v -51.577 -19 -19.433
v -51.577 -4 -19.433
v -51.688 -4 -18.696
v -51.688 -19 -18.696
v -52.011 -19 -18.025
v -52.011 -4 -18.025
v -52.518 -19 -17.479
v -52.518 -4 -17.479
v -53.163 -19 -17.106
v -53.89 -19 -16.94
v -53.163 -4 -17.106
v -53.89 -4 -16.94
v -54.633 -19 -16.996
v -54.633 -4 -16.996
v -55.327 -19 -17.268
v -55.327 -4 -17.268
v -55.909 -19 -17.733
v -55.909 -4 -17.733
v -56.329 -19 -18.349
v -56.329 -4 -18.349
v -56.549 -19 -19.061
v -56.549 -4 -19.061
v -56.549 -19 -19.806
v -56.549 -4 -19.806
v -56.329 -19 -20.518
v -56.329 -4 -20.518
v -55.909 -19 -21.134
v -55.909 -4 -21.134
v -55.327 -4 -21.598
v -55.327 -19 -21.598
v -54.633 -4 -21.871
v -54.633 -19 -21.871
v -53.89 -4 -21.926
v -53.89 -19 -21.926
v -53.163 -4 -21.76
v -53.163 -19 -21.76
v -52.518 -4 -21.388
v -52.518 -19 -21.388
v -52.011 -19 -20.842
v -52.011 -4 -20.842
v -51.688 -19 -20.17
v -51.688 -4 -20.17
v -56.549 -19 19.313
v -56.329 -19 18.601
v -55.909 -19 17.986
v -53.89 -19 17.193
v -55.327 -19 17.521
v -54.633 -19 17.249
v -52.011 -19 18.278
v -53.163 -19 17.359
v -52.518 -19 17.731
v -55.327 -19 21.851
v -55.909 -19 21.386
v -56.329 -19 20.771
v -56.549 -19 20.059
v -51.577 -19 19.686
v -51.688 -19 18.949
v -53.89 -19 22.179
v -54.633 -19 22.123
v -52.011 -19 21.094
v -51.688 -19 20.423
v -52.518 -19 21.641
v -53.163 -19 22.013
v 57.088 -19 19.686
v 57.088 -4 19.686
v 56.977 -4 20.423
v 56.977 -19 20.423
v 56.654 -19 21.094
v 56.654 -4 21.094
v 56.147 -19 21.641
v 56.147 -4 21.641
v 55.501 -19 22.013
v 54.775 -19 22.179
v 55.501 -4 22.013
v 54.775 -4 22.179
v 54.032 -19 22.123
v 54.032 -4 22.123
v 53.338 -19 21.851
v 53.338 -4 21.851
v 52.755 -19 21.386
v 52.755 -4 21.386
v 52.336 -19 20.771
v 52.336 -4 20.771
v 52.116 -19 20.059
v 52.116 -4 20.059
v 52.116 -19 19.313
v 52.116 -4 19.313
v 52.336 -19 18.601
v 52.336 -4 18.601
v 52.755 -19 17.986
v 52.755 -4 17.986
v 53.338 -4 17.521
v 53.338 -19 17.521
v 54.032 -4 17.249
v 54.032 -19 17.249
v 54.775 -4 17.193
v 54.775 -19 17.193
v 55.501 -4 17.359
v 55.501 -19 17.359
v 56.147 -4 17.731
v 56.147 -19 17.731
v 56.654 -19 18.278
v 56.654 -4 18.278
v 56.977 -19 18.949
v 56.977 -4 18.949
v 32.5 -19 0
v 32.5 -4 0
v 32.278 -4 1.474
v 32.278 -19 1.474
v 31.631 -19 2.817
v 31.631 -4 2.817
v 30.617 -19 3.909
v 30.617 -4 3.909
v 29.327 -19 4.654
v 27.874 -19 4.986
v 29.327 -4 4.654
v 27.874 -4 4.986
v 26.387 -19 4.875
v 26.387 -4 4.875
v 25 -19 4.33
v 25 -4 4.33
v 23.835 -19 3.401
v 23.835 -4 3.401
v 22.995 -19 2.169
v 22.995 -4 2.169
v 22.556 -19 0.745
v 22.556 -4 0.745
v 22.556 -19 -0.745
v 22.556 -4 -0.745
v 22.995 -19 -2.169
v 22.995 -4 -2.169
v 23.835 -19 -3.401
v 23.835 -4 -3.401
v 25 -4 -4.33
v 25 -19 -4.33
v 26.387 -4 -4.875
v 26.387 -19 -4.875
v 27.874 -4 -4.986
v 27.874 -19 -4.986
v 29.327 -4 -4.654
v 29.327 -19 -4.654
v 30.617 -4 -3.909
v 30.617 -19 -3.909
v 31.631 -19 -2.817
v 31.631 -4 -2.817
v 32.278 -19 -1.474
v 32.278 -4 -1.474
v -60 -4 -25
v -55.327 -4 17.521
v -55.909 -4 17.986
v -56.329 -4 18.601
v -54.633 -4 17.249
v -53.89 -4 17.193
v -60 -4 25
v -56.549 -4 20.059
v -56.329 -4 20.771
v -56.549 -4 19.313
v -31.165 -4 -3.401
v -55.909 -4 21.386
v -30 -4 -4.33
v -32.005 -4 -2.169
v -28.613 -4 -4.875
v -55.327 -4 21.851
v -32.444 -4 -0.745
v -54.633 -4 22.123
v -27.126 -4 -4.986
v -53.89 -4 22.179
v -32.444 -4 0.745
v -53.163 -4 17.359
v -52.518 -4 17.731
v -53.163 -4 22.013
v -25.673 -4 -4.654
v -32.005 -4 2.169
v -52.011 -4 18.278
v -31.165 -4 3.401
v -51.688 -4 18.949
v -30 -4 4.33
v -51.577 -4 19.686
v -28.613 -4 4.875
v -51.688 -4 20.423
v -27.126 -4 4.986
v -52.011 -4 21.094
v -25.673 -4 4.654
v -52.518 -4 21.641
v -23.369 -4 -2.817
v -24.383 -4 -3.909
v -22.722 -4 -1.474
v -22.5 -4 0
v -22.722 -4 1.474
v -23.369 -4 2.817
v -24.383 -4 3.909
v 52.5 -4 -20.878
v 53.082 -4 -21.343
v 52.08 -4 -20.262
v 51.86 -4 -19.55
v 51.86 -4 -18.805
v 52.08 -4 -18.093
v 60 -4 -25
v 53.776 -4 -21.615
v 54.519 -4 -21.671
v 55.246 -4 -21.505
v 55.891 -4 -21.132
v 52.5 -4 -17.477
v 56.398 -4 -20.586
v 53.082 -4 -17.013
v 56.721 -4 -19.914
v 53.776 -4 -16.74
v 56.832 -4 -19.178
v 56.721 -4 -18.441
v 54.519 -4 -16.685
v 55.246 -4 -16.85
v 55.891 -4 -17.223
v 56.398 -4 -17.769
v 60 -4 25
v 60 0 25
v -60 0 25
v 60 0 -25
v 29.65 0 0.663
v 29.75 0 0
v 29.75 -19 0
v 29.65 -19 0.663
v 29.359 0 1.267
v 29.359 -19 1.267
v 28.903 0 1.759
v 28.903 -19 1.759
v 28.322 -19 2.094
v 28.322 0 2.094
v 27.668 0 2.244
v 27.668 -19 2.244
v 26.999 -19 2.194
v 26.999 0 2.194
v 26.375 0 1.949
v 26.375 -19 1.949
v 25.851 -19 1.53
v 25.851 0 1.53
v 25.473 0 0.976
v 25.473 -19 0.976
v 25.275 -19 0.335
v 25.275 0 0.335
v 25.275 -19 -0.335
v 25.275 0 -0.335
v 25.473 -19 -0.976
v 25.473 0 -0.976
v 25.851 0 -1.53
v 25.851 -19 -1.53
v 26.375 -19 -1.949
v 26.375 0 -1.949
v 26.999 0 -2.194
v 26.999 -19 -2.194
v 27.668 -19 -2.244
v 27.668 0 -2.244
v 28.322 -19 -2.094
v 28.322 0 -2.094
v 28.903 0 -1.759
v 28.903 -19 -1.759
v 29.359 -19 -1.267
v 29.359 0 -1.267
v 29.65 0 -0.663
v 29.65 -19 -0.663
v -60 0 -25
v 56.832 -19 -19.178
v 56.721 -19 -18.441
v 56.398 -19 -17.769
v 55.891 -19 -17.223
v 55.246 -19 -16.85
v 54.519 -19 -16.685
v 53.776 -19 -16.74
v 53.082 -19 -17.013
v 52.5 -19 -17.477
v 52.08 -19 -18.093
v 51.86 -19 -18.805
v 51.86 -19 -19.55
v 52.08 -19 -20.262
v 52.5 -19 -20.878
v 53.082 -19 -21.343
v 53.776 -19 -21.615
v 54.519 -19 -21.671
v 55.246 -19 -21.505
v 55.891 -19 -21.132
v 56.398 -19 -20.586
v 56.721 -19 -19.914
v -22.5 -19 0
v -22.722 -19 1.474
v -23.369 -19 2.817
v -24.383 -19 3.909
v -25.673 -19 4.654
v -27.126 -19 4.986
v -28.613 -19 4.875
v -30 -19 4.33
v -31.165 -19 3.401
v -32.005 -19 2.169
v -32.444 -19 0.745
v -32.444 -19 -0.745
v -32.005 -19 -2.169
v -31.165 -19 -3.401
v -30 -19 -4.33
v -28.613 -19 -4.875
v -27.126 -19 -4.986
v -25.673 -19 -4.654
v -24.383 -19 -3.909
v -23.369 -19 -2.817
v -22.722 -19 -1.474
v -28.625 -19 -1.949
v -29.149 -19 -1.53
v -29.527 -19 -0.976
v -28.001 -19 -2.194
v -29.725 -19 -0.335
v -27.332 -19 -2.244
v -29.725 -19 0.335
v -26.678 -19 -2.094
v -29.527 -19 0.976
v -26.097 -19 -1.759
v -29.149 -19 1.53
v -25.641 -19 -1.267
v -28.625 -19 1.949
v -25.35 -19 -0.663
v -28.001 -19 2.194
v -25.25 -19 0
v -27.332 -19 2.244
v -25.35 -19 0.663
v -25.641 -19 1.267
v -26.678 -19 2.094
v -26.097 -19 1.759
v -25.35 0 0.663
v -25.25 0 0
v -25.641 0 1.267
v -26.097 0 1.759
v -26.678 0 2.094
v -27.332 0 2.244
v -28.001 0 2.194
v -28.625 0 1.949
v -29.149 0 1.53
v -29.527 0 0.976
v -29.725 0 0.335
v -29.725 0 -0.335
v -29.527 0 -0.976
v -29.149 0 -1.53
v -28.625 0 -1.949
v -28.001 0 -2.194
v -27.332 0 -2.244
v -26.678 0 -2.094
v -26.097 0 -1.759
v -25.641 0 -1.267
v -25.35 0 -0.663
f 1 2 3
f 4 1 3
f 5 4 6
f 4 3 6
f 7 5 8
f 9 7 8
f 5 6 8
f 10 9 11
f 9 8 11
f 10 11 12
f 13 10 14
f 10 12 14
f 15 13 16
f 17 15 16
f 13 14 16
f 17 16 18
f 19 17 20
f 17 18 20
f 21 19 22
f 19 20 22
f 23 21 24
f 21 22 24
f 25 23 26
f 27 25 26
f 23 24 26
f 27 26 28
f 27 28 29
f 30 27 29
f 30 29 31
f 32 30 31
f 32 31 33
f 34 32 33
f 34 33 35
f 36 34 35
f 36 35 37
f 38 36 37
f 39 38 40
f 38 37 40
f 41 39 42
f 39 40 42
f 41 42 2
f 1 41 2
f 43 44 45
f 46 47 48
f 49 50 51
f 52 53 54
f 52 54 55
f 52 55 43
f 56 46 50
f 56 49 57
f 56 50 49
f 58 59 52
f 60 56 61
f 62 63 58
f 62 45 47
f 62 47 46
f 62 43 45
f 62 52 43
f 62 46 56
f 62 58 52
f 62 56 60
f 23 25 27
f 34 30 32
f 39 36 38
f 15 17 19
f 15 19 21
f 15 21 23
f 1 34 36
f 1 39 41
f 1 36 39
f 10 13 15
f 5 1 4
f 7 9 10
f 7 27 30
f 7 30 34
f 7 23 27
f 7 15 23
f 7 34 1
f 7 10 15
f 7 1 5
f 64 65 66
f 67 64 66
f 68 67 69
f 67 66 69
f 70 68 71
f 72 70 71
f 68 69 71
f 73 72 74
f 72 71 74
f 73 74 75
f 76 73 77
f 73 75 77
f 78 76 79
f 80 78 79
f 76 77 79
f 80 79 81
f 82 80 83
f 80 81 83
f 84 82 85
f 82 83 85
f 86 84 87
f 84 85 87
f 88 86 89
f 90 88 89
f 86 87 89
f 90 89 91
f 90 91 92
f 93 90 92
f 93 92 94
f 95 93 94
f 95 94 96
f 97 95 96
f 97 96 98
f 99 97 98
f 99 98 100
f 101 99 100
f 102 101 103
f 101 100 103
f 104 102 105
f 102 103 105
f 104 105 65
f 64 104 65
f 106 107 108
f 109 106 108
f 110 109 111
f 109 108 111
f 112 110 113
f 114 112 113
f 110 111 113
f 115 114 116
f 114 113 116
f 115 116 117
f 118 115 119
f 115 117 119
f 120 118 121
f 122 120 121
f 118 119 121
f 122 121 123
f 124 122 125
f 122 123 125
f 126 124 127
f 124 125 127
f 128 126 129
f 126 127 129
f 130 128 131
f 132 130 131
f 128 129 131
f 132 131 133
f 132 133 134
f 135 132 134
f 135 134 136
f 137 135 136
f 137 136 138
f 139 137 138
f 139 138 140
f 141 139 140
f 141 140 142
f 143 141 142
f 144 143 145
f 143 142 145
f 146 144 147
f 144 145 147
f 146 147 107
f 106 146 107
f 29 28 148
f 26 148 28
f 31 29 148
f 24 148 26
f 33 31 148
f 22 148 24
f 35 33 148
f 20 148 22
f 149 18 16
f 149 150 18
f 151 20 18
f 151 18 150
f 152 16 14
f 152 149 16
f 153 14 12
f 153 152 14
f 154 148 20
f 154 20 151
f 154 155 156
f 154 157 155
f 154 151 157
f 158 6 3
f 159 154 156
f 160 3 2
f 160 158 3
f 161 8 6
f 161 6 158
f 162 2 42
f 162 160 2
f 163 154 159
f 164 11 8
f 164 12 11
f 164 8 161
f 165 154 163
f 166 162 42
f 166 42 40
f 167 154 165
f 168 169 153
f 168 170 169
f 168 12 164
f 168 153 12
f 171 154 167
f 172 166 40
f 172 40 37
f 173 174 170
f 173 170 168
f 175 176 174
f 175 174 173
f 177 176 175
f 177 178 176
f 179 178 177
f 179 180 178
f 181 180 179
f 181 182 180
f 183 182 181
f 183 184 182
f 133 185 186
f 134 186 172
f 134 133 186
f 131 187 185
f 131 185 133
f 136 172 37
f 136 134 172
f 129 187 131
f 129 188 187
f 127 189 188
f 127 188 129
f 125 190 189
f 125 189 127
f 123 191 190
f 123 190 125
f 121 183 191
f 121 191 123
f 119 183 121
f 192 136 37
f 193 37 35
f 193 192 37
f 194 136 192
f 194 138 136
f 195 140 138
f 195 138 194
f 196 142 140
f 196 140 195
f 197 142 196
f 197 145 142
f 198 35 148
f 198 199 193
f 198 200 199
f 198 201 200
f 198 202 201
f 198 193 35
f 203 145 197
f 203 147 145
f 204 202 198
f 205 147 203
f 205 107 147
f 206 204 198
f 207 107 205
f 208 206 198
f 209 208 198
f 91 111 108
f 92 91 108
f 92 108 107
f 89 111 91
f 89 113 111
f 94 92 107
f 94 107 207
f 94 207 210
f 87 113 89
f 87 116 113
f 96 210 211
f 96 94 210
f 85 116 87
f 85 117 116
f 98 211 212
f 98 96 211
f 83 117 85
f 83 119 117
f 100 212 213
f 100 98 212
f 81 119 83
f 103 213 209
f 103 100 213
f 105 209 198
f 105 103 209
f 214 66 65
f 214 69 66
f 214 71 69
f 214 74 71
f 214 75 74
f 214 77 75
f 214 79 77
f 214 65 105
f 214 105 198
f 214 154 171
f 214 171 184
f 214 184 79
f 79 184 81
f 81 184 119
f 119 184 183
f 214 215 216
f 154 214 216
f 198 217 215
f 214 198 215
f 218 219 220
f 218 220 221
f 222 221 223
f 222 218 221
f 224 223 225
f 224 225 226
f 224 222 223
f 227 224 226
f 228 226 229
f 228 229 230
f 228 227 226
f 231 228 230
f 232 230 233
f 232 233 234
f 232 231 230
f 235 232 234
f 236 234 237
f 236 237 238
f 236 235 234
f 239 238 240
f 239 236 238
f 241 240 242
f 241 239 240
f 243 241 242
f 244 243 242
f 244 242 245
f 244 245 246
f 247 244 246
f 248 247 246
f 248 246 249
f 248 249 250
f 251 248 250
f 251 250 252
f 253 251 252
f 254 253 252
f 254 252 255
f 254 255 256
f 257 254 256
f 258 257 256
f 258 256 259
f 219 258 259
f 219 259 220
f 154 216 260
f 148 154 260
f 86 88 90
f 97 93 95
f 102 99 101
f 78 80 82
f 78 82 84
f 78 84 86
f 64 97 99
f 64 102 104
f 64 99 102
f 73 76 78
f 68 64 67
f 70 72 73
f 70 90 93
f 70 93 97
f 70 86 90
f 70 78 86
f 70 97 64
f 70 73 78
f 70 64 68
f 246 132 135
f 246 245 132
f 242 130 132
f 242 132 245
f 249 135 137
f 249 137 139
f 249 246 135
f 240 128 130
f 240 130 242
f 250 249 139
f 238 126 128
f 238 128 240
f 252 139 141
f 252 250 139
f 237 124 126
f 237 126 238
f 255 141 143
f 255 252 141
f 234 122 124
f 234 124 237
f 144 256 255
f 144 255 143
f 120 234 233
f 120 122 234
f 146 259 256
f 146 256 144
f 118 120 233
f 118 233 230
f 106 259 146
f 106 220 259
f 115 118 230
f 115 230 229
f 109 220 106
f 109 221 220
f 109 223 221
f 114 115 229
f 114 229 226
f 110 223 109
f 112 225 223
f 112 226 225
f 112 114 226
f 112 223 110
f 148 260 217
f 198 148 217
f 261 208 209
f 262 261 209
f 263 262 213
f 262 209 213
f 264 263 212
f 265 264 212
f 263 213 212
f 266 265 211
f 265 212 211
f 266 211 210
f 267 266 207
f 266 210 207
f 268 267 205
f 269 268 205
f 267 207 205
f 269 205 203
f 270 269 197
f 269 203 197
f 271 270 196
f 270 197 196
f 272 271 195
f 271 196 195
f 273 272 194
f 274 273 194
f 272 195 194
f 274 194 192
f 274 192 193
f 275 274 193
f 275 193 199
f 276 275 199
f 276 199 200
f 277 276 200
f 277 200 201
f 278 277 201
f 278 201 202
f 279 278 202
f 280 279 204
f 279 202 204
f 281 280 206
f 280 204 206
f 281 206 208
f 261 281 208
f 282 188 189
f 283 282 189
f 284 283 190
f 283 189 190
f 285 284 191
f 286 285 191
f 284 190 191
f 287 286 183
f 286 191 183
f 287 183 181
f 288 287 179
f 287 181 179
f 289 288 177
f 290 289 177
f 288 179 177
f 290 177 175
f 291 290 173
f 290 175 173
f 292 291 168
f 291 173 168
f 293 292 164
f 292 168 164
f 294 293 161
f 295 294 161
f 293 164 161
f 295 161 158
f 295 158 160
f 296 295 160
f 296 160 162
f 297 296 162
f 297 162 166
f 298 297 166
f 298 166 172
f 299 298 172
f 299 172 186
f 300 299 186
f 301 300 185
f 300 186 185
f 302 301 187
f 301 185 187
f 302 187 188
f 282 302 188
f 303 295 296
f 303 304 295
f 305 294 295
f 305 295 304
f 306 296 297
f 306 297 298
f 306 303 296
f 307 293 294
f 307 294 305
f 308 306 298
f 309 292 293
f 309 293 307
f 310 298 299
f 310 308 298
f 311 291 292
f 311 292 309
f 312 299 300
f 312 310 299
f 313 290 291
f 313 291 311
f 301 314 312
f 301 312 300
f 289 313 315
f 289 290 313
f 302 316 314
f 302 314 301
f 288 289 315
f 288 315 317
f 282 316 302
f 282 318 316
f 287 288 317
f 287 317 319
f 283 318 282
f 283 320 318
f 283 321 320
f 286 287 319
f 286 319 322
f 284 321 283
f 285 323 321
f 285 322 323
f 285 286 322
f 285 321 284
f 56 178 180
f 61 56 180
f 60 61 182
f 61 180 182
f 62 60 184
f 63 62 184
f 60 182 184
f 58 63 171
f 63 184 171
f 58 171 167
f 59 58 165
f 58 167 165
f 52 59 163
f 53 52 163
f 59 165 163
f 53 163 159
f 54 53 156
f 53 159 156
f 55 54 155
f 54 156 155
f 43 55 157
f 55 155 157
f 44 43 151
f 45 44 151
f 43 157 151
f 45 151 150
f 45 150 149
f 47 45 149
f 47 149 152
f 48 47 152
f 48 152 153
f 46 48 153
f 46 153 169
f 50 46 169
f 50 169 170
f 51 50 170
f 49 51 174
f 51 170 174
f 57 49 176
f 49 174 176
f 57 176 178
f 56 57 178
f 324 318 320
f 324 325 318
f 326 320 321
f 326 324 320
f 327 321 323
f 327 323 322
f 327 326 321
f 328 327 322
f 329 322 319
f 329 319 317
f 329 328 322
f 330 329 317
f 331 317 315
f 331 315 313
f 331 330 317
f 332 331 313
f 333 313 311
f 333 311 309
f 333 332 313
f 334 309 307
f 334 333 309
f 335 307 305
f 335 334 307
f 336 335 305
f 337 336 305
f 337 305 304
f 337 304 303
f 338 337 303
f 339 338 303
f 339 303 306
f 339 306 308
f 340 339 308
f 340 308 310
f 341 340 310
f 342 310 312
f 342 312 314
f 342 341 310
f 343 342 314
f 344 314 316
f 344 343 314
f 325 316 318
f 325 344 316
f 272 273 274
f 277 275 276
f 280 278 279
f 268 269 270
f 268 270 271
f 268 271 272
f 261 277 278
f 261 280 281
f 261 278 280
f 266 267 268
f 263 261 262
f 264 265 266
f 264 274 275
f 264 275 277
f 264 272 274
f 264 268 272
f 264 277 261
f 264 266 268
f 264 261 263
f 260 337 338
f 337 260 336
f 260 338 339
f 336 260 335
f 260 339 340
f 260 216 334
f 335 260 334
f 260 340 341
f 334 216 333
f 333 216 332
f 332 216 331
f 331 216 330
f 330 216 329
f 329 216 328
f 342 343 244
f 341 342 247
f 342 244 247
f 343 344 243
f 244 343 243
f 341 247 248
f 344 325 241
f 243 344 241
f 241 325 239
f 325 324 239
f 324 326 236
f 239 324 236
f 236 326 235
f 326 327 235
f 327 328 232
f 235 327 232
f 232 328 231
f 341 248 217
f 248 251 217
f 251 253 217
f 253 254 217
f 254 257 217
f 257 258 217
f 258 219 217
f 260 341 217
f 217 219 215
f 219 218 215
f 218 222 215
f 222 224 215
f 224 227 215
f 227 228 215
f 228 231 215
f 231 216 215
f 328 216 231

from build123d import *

# Parameters (mm, degrees)
F0_R     = 2.25
F1_DEPTH = 4
F2_R     = 5
F2_R_2   = 2.25
F3_DEPTH = 15
F4_R     = 2.5
F5_DEPTH = 15


with BuildPart() as f1:
    # F0 (on Front) → F1 (new body)
    with BuildSketch(Plane.XZ):
        Polygon((-60, -25), (0, -25), (60, -25), (60, 25), (-60, 25), align=None)
        with Locations((-27.5, 0)):
            Circle(F0_R, mode=Mode.SUBTRACT)
        with Locations((27.5, 0)):
            Circle(F0_R, mode=Mode.SUBTRACT)
    extrude(amount=F1_DEPTH)

    # F2 (on face) → F3 (join)
    with BuildSketch(Plane.XZ.offset(4)):
        with Locations((-27.5, 0)):
            Circle(F2_R)
        with Locations((-27.5, 0)):
            Circle(F2_R_2, mode=Mode.SUBTRACT)
        with Locations((27.5, 0)):
            Circle(F2_R)
        with Locations((27.5, 0)):
            Circle(F2_R_2, mode=Mode.SUBTRACT)
    extrude(amount=F3_DEPTH)

    # F4 (on face) → F5 (join)
    with BuildSketch(Plane.XZ.offset(4)):
        with Locations((-54.076705, 19.686049)):
            Circle(F4_R)
        with Locations((-54.076705, -19.433273)):
            Circle(F4_R)
        with Locations((54.332387, -19.177591)):
            Circle(F4_R)
        with Locations((54.588076, 19.686049)):
            Circle(F4_R)
    extrude(amount=F5_DEPTH)


solid = f1.part
